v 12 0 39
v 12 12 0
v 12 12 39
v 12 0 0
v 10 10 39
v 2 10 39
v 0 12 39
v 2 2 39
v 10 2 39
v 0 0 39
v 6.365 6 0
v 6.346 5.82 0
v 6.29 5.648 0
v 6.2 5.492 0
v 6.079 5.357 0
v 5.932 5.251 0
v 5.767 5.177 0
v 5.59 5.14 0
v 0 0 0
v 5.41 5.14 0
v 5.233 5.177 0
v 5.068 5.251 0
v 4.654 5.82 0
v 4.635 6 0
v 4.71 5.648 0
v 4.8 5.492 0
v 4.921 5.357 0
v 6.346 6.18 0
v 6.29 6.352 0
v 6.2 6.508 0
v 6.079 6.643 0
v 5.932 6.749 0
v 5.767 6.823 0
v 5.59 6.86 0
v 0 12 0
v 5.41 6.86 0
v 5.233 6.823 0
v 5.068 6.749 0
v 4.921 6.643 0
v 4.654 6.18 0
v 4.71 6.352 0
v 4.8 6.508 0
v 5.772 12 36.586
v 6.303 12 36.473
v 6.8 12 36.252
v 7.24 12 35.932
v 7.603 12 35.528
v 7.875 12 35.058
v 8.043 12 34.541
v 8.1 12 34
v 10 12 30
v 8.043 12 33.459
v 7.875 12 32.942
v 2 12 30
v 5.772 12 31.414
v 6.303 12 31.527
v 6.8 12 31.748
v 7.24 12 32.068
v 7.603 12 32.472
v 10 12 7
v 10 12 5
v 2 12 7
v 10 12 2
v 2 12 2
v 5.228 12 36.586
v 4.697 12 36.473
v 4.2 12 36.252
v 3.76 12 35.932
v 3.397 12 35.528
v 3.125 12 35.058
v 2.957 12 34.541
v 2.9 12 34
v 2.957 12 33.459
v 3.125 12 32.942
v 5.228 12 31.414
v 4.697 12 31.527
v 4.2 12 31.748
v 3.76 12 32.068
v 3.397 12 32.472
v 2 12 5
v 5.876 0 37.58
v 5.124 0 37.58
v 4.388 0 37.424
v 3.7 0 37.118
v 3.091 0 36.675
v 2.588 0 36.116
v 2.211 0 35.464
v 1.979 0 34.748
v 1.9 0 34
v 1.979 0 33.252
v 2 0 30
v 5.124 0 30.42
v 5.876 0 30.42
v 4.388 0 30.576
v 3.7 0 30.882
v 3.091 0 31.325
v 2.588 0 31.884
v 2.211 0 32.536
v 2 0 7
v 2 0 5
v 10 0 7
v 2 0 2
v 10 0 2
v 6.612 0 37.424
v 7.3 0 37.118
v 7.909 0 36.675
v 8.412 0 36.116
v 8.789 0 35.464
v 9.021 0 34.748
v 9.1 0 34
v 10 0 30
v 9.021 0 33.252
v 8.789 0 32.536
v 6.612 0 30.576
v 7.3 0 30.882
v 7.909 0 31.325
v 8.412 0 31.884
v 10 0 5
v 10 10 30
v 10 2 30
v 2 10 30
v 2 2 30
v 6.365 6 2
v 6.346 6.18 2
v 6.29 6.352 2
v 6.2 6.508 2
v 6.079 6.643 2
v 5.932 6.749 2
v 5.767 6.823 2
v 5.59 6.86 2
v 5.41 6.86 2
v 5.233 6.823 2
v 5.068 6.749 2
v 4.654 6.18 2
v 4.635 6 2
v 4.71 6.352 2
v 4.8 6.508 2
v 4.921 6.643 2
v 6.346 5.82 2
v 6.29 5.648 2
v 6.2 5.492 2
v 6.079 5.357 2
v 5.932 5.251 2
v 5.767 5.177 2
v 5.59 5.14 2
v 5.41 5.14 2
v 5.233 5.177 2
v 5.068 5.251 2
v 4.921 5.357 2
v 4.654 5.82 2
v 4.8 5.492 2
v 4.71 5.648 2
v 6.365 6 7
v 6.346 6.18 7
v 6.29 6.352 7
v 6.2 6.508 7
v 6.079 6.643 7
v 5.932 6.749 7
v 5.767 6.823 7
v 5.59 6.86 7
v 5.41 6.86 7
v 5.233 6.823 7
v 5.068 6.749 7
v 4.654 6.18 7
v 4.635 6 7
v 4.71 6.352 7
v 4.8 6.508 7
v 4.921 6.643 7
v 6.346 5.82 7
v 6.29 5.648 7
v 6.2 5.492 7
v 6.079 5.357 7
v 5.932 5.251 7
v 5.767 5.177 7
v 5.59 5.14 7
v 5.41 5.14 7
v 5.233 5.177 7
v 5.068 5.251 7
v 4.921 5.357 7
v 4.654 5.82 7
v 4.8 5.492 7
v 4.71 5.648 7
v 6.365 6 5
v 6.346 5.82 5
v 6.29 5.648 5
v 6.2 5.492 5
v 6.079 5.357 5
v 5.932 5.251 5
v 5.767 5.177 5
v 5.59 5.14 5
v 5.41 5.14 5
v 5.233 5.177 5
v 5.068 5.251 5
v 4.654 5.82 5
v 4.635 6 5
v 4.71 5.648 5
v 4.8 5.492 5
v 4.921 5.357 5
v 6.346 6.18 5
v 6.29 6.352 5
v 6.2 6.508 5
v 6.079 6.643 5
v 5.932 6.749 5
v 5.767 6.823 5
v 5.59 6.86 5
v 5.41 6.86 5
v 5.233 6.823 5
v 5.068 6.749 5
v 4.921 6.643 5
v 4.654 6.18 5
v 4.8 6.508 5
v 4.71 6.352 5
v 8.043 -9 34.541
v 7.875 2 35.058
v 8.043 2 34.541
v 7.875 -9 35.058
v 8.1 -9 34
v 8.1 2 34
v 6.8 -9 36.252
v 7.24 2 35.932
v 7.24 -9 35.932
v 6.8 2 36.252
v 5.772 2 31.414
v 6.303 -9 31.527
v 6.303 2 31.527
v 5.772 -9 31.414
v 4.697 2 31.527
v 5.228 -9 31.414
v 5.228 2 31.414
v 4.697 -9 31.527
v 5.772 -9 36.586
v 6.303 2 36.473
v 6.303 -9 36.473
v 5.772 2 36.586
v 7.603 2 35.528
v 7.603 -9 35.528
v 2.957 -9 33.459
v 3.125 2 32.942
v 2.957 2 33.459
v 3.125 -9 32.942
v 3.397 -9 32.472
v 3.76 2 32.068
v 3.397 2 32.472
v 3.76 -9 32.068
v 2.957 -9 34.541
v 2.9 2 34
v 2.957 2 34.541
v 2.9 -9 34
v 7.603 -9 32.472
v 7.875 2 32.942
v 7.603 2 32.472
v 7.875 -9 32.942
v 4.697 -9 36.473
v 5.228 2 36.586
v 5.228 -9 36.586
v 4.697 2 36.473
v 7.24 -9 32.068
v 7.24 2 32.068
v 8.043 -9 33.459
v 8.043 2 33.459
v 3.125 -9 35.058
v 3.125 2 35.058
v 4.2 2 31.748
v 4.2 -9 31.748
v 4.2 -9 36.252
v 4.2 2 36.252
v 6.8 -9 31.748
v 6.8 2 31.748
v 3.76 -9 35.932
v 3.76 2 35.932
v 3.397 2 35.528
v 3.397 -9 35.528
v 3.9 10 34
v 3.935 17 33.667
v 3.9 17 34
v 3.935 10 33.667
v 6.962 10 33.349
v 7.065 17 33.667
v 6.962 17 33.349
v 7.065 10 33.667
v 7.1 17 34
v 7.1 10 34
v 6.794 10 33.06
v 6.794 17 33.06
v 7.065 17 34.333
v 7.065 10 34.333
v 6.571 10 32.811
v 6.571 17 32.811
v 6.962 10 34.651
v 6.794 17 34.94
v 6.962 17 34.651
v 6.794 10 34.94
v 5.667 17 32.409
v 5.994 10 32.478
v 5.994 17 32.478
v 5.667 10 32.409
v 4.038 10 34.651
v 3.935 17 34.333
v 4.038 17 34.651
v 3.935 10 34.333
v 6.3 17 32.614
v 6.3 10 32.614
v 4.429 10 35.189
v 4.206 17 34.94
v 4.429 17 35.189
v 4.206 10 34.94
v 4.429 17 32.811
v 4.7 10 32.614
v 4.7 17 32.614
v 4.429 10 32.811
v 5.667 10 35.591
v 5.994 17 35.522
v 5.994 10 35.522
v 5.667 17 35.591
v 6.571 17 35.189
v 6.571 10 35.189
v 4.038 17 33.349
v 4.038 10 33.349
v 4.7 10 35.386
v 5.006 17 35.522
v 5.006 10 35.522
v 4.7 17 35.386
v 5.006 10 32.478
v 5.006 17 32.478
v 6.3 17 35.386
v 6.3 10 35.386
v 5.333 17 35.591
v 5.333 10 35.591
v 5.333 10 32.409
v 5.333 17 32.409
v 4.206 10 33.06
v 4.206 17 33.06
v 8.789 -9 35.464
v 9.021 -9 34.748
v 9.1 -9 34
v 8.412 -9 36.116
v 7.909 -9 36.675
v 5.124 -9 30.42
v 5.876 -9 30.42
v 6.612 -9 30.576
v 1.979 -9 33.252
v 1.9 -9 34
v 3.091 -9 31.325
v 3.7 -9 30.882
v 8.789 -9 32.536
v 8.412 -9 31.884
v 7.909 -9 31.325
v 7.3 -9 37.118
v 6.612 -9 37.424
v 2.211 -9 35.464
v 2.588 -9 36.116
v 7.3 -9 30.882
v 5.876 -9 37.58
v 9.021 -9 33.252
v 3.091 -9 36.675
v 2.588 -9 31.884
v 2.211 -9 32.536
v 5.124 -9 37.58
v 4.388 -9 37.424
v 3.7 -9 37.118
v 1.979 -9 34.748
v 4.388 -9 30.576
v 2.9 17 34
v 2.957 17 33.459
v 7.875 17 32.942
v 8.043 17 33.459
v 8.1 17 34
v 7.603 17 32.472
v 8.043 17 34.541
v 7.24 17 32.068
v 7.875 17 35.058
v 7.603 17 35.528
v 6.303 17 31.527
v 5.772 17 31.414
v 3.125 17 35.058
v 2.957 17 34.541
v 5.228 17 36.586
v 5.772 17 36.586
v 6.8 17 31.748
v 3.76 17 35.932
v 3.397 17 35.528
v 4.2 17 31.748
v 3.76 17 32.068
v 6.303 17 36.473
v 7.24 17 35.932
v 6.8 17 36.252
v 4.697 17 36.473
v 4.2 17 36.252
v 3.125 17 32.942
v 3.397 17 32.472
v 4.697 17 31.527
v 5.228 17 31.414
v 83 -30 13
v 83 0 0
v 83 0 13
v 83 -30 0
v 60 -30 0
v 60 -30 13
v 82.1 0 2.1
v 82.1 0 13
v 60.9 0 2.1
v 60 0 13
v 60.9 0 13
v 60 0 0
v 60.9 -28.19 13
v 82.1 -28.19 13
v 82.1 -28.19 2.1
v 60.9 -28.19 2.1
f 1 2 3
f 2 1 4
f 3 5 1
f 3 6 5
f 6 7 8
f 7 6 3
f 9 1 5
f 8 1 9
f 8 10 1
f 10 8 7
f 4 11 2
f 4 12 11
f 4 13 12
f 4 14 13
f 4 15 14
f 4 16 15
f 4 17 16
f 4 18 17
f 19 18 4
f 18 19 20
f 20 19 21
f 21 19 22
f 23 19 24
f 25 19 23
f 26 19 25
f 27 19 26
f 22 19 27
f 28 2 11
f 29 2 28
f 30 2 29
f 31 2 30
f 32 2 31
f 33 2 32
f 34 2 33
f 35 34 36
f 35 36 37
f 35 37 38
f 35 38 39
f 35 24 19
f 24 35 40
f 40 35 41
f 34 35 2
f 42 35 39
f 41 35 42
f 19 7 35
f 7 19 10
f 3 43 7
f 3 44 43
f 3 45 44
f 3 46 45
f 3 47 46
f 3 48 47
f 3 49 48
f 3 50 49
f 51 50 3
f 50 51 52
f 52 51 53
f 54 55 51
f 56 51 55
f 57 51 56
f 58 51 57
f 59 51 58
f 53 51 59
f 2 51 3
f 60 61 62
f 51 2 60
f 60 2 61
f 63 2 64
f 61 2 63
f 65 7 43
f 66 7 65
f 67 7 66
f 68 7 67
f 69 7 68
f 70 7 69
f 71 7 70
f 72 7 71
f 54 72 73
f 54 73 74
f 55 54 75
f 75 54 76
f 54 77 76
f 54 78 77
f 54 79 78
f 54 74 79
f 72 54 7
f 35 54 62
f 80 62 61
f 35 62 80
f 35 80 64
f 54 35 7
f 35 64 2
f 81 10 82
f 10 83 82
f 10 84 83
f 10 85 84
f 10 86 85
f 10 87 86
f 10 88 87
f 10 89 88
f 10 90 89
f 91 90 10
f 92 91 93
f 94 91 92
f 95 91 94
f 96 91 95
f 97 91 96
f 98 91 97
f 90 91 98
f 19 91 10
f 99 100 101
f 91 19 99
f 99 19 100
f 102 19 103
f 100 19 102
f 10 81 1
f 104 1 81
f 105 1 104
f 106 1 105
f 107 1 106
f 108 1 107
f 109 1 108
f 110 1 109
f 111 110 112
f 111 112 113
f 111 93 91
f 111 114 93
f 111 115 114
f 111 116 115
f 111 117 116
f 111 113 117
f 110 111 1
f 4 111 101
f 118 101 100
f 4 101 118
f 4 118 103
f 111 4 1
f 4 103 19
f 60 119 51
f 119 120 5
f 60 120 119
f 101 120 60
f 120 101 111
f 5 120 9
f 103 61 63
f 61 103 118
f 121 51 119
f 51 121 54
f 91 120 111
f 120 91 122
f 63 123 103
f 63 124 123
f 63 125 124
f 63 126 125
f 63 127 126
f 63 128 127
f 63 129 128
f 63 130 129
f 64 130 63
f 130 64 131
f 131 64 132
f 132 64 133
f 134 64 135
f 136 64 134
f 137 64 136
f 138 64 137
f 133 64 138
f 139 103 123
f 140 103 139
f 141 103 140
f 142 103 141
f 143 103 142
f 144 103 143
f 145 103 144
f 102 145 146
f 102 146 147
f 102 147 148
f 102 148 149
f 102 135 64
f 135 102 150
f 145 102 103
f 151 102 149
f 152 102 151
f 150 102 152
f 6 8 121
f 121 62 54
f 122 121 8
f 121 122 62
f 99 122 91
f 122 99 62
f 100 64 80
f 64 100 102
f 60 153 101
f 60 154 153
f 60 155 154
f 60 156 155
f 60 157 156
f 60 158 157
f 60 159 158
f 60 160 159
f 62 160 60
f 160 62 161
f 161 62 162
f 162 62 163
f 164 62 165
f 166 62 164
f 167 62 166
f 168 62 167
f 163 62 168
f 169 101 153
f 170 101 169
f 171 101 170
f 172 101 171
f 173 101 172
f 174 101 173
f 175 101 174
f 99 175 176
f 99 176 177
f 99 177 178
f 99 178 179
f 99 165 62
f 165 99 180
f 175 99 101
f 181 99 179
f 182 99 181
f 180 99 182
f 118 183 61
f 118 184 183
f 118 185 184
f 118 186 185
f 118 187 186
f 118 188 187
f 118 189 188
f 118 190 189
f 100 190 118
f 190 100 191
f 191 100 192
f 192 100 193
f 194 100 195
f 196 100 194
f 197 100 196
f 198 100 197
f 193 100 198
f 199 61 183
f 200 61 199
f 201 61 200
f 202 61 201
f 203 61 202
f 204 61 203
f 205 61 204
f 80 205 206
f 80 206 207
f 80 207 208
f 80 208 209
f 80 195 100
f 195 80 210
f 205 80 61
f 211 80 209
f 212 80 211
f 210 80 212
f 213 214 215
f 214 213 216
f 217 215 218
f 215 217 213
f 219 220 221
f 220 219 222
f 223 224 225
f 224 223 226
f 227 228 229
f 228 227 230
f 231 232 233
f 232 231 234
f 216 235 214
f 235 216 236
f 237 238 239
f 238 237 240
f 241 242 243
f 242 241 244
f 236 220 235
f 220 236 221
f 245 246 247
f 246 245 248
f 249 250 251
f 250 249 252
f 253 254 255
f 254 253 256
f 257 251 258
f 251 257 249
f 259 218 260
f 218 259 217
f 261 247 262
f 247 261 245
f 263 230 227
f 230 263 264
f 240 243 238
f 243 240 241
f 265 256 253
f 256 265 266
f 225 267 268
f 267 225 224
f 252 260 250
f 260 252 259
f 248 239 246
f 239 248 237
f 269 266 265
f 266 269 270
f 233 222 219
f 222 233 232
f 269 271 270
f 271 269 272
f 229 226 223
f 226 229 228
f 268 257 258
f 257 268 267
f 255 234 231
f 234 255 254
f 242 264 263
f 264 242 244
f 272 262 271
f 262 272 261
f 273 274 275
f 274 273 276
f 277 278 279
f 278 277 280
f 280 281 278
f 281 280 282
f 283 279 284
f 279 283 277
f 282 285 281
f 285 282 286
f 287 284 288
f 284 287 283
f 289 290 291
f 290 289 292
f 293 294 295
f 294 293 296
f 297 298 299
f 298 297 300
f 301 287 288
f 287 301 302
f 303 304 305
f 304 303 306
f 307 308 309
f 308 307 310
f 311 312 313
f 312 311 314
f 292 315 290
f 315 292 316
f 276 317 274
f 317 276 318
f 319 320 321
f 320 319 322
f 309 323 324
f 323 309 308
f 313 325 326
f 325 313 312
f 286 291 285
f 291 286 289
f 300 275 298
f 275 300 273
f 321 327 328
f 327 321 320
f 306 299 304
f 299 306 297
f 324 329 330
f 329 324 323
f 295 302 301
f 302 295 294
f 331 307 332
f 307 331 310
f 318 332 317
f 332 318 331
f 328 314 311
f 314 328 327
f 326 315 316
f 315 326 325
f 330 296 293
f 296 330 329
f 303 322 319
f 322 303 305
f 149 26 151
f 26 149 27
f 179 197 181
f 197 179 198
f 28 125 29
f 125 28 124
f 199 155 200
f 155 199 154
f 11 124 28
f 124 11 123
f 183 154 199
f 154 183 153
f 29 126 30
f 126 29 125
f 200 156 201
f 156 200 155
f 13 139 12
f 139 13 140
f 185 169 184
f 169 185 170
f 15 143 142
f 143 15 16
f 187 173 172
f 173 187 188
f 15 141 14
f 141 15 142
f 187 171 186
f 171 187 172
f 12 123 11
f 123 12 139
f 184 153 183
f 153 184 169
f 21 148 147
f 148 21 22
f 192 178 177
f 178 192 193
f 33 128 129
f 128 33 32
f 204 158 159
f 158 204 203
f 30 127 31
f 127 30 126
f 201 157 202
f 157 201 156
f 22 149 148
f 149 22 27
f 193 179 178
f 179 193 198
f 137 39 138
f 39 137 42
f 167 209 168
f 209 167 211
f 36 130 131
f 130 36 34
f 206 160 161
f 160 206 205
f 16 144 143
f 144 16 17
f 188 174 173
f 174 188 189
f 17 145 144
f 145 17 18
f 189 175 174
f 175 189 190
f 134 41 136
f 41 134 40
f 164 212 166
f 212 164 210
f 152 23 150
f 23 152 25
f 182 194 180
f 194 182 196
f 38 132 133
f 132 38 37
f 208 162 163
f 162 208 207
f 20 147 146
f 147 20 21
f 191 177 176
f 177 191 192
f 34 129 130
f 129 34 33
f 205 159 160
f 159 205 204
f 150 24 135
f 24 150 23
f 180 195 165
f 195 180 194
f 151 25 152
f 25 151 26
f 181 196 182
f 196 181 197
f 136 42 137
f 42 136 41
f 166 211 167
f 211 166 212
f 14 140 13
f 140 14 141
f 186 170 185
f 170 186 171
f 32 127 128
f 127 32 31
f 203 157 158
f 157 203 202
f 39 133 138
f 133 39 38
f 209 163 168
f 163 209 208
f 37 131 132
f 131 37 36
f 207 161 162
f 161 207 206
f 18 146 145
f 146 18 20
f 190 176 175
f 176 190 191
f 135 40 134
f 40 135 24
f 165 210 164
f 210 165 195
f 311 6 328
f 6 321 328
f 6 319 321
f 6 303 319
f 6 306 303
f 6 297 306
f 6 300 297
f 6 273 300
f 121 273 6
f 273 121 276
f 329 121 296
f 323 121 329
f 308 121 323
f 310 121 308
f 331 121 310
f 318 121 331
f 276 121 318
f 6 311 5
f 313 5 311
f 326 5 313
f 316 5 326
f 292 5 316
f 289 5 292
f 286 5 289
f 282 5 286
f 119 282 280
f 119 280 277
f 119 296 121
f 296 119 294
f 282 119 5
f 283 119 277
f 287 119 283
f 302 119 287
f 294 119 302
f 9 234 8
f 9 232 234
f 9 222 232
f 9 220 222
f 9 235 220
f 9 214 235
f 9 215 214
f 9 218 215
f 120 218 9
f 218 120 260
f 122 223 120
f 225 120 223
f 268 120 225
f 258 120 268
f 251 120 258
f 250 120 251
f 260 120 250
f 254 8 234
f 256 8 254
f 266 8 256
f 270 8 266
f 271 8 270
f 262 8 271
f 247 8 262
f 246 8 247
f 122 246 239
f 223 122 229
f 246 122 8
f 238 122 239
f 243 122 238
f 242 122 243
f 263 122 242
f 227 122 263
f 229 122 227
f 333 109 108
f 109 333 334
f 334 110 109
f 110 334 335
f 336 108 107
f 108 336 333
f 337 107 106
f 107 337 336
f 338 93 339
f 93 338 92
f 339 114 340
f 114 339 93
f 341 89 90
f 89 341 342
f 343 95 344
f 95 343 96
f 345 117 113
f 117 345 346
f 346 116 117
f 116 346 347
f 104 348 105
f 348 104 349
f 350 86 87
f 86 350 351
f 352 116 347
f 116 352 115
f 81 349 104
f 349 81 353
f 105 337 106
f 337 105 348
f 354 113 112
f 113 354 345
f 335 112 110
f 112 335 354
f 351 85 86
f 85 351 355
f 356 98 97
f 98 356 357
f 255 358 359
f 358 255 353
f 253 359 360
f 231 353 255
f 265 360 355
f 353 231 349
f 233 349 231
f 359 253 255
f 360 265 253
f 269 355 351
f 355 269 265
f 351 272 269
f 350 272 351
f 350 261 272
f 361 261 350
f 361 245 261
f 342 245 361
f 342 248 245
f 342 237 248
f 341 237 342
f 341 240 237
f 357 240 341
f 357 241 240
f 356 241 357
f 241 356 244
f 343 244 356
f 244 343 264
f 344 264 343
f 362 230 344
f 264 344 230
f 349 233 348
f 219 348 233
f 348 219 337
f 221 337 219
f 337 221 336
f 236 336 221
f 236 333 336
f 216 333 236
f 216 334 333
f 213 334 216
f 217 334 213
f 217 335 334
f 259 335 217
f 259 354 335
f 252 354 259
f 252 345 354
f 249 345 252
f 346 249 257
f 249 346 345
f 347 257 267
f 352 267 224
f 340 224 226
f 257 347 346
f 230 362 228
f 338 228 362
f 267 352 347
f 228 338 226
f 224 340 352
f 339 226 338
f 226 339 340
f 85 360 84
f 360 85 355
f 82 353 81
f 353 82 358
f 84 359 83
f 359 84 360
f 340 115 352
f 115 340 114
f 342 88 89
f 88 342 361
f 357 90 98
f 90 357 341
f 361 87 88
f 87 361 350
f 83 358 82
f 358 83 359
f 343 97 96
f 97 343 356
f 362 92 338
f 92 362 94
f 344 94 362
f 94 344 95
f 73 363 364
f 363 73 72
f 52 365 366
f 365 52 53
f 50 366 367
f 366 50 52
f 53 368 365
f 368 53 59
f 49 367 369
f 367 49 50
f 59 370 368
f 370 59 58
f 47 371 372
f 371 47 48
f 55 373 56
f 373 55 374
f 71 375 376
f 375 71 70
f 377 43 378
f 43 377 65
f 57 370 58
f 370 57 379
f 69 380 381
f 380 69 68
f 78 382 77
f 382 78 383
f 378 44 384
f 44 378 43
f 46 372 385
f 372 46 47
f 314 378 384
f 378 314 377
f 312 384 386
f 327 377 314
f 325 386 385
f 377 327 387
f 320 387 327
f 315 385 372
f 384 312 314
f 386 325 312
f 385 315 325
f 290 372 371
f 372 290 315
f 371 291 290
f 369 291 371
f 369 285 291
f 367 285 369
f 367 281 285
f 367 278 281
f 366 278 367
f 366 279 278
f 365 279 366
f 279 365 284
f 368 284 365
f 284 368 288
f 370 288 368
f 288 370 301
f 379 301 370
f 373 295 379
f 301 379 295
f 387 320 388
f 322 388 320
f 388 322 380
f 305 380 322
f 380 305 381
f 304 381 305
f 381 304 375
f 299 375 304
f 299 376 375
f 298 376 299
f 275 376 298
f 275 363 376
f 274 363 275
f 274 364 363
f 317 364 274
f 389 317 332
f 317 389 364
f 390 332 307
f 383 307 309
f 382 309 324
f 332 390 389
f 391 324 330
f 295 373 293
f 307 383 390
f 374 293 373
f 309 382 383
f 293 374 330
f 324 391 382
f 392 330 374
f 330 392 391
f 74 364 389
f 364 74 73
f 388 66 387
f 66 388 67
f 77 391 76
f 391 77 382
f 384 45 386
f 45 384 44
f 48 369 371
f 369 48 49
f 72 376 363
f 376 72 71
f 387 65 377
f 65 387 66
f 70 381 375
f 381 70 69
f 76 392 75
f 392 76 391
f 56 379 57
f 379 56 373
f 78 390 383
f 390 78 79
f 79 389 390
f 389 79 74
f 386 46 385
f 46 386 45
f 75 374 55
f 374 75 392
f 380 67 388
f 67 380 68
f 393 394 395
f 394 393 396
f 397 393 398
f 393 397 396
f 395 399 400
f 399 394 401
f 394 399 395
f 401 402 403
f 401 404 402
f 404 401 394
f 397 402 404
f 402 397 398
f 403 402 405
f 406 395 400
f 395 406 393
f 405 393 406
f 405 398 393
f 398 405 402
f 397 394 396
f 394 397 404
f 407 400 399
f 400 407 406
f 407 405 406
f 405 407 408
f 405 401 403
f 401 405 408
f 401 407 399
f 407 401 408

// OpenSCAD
// file: ring.scad
///////////////////////////////////////
// Module to make rings              //
// aka cylinders with holes in them  //
// ring (hole diameter,              //
//       ring thickness,             //
//       ring height)                //
// developed by AM Chagas 09-2019    //
//      CC-BY-SA 4.0                 //
///////////////////////////////////////

module ring(ringd=10,ringb=5,ringh=2){
    difference(){
        cylinder(d=ringd+ringb,h=ringh);
        translate([0,0,-1]){
            cylinder(d=ringd,h=ringh+2);
        }//endtranslate
    }//end difference
}//end module

//ring(10,10,50);
// main file
///////////////////////////////////////////
// Design for a liking spout to be used  //
// in the behaviour box                  //
//  CC-BY-SA 4.0 20191008                //
//  Andre Maia Chagas                    //
///////////////////////////////////////////

// all dimensions in mm.

//needs the ring.scad file (saved on the same folder)
use <ring.scad>

//// variables /////////////

//needle used as licking spout
needlediameter = 1.53;

//back plate dimensions 
//(the plate that slides on the metal railings)
backpanelx = 44.5*2;
backpanely = 59.80;
backpanelz = 2.15;

supportw=5;

//dimensions for the headport 
//(a "negative" space where the licking spout will be placed)
headportx = 30;
headporty = 30;
headportz = 30;
lickspoutoffset = 5;
//wall thickness
headportwall = 2;
protusion = 30;

//force sensor dimensions
forcesensord = 18.3;
forcesensorh = 0.8;
forcesensorl = 33; //how long the long part of the sensor
forcesensorw = 8; // wiidth of the long part of the sensor

//infrared led dimensions
irrecd = 3;
irrech = 5;
irledd = 5;
irledh = 9;

//nut & screw infor
screwd = 3.2;
nutd = 5;

/* change this depending on the printer and printer settings
   it is a "tolerance" variable, so holes and fittings can be 
   adjusted.
*/
tol = 0.1;

$fn=30;
//%cube([backpanelx,backpanely,backpanelz]);


//supporting modules



module irholes(){
    rotate([90,0,0]){
        translate([0,0,0]){
            cylinder(d=irledd+2*tol,h=irledh);
        }//end translate
        translate([0,0,-headporty]){    
            cylinder(d=irrecd+2*tol,h=irledh);
        }//end translate
     }//end rotate
}//end module ir holes
////

module irsupports(){
rotate([90,0,0]){
    translate([0,0,headportwall]){
ring(irledd+2*tol,2,irledh);
    }//end translate
translate([0,0,-headporty+headportwall/2]){    
    ring(irrecd+2*tol,2,irrech);
    }//end translate
}//end rotate
}//end module ir holes
////


module fsensorholder(){
difference(){
union(){
    cylinder(d=forcesensord+2*tol+headportwall,h=forcesensorh+headportwall/2);
    translate([-4.5,-13,-2]){
        cube([forcesensorw+headportwall,forcesensord+5,forcesensorh+headportwall/2+2]);
    }//end translate
}//end union

union(){
    translate([0,0,forcesensorh/2+headportwall/2]){
        cylinder(d=forcesensord+2*tol,h=forcesensorh);
    }//end translate
    translate([(-forcesensorw+headportwall/2)/2,0,(forcesensorh+headportwall)/2]){
        cube([forcesensorw+2*tol,forcesensorl+headportwall,5]);
    }//end translate
    translate([needlediameter/2,headporty/2+2,needlediameter/4+headportwall/2]){
        rotate([90,0,0]){
            cylinder(d=needlediameter+2*tol,h=55);
        }//end rotate
    }//end translate
}//end union

}//end difference

}//end module
/////////////////////////////


module needlesupport(){
    module mainframe(){
difference(){
cube([8+2*headportwall,forcesensorw+2*headportwall,35+2*headportwall]);
translate([headportwall,-headportwall,headportwall]){
cube([8,forcesensorw+4*headportwall,28]);
}//end translate
}//end difference
translate([headportwall,0,5]){
cube([8,forcesensorw+2*headportwall,headportwall]);
}//end translate
}//end submodule

difference(){
mainframe();


translate([irrecd/2+2*headportwall,(forcesensorw+2*headportwall)/2,-headportwall-1]){
    rotate([0,0,0]){
        cylinder(d=needlediameter+2*tol,h=20);
    }//end rotate
    translate([0,0,35+headportwall]){
    rotate([90,0,0]){
        
        cylinder(d=irledd+2*tol,h=20);
        
    }//end rotate
    rotate([-90,0,0]){
        
        cylinder(d=irrecd+2*tol,h=20);
        
    }//end rotate
    }//end translate
}//end translate



translate([headportwall,headportwall,10]){
        cube([8,forcesensorw,30]);
        
    }//end translate
    
}//end difference
translate([(8+headportwall)/2+0.5,0,35+headportwall-irledd/2-0.5]){
rotate([90,0,0]){
ring(irledd+2*tol,2,irledh);
}//end rotate
}//end translate
translate([(8+headportwall)/2+0.5,forcesensorw+2*headportwall,35+headportwall-irrecd]){
rotate([-90,0,0]){
ring(irrecd+2*tol,2,irrech);

}//end rotate
}//end translate
}//end module
///


/////////////////////////////
module lickingport(){
//head port
difference(){
cube([headportx,headporty,headportz]);
    
    
union(){    
translate([headportwall,headportwall,headportwall]){
cube([headportx-headportwall*2,headporty-headportwall*2,headportz]);
}//end translate


//needle entry
translate([headportx/5+lickspoutoffset-needlediameter/2,(headporty-headportwall+needlediameter)/2,-35]){
    cylinder(d=3*needlediameter+2*tol,h=50);
    }//end translate
 
    //led side ports
    translate([headportx/5+5,headportwall+2,4*headportz/5-4]){
        irholes();
    }//end translate
}//end union
}//end difference
///////////////////////

////////////////////////////
    
///////////////////////////
//base plate with round liquid reservoir


difference(){ 
cube([headportx/5,headporty,headportz]);
translate([headportx/5,headporty/2,3*headportz/6]){
    sphere(d=12);
    }//end translate
}//end difference
    
////////////////////////////

translate([headportx/5+5,headportwall+2,4*headportz/5-4]){
irsupports();
}
}//end licking port


module backpanel(){
difference(){
translate([-(headportx+2*headportwall)/2,-backpanely/2+headporty/2,headportz-headportwall-0.15]){

cube([backpanelx,backpanely,backpanelz]);
    

}
translate([0,0,5]){
cube([headportx,headporty,headportz]);
}//end transalte
}//end difference
}//end module

module covers(){
    difference(){
    
        cube([headportx-7,2*headportwall+irledh,headportz]);
    translate([(headportwall*0.9)/2,headportwall+0.1,-.01]){
    cube([headportx-7-headportwall*0.9,headportwall+irledh,headportz-headportwall*0.9]);
    }

}//end difference
}//end module

/*
///////////////////////////
lickingport();
backpanel();
///////////////////////////
*/
//translate([5,headporty/2-(forcesensorw+2*headportwall)/2,-(35+2*headportwall)]){
//rotate([0,0,180]){
//fsensorholder();
needlesupport();
//}//end rotate
//}//end translate


//
//needlesupport();

/*
difference(){
lickingport();
translate([headportx-headportwall-5,-1,-2]){
cube([20,headporty+2,headportz+5]);
}//end translate
}//end difference

difference(){
translate([-(headportx+headportwall),-backpanely/2+headporty/2,0]){
cube([backpanelx,backpanely,backpanelz]);
    }//end translate

translate ([6,-8,-1]){
cube([14,10,10]);
}
translate ([6,headporty,-1]){
cube([14,9,10]);
}

translate ([6,10,-1]){
cube([14,9,10]);
}

union(){
translate([0,-(2*headportwall+irledh),2]){
covers();}
translate([0,headporty+irledh+2*headportwall,2]){
mirror([0,1,0]){
covers();
}//end mirror
}//end translate
}//end union
}
*/
rotate([90,0,0]){
translate([2*headportx,0,0]){
covers();
}
}
